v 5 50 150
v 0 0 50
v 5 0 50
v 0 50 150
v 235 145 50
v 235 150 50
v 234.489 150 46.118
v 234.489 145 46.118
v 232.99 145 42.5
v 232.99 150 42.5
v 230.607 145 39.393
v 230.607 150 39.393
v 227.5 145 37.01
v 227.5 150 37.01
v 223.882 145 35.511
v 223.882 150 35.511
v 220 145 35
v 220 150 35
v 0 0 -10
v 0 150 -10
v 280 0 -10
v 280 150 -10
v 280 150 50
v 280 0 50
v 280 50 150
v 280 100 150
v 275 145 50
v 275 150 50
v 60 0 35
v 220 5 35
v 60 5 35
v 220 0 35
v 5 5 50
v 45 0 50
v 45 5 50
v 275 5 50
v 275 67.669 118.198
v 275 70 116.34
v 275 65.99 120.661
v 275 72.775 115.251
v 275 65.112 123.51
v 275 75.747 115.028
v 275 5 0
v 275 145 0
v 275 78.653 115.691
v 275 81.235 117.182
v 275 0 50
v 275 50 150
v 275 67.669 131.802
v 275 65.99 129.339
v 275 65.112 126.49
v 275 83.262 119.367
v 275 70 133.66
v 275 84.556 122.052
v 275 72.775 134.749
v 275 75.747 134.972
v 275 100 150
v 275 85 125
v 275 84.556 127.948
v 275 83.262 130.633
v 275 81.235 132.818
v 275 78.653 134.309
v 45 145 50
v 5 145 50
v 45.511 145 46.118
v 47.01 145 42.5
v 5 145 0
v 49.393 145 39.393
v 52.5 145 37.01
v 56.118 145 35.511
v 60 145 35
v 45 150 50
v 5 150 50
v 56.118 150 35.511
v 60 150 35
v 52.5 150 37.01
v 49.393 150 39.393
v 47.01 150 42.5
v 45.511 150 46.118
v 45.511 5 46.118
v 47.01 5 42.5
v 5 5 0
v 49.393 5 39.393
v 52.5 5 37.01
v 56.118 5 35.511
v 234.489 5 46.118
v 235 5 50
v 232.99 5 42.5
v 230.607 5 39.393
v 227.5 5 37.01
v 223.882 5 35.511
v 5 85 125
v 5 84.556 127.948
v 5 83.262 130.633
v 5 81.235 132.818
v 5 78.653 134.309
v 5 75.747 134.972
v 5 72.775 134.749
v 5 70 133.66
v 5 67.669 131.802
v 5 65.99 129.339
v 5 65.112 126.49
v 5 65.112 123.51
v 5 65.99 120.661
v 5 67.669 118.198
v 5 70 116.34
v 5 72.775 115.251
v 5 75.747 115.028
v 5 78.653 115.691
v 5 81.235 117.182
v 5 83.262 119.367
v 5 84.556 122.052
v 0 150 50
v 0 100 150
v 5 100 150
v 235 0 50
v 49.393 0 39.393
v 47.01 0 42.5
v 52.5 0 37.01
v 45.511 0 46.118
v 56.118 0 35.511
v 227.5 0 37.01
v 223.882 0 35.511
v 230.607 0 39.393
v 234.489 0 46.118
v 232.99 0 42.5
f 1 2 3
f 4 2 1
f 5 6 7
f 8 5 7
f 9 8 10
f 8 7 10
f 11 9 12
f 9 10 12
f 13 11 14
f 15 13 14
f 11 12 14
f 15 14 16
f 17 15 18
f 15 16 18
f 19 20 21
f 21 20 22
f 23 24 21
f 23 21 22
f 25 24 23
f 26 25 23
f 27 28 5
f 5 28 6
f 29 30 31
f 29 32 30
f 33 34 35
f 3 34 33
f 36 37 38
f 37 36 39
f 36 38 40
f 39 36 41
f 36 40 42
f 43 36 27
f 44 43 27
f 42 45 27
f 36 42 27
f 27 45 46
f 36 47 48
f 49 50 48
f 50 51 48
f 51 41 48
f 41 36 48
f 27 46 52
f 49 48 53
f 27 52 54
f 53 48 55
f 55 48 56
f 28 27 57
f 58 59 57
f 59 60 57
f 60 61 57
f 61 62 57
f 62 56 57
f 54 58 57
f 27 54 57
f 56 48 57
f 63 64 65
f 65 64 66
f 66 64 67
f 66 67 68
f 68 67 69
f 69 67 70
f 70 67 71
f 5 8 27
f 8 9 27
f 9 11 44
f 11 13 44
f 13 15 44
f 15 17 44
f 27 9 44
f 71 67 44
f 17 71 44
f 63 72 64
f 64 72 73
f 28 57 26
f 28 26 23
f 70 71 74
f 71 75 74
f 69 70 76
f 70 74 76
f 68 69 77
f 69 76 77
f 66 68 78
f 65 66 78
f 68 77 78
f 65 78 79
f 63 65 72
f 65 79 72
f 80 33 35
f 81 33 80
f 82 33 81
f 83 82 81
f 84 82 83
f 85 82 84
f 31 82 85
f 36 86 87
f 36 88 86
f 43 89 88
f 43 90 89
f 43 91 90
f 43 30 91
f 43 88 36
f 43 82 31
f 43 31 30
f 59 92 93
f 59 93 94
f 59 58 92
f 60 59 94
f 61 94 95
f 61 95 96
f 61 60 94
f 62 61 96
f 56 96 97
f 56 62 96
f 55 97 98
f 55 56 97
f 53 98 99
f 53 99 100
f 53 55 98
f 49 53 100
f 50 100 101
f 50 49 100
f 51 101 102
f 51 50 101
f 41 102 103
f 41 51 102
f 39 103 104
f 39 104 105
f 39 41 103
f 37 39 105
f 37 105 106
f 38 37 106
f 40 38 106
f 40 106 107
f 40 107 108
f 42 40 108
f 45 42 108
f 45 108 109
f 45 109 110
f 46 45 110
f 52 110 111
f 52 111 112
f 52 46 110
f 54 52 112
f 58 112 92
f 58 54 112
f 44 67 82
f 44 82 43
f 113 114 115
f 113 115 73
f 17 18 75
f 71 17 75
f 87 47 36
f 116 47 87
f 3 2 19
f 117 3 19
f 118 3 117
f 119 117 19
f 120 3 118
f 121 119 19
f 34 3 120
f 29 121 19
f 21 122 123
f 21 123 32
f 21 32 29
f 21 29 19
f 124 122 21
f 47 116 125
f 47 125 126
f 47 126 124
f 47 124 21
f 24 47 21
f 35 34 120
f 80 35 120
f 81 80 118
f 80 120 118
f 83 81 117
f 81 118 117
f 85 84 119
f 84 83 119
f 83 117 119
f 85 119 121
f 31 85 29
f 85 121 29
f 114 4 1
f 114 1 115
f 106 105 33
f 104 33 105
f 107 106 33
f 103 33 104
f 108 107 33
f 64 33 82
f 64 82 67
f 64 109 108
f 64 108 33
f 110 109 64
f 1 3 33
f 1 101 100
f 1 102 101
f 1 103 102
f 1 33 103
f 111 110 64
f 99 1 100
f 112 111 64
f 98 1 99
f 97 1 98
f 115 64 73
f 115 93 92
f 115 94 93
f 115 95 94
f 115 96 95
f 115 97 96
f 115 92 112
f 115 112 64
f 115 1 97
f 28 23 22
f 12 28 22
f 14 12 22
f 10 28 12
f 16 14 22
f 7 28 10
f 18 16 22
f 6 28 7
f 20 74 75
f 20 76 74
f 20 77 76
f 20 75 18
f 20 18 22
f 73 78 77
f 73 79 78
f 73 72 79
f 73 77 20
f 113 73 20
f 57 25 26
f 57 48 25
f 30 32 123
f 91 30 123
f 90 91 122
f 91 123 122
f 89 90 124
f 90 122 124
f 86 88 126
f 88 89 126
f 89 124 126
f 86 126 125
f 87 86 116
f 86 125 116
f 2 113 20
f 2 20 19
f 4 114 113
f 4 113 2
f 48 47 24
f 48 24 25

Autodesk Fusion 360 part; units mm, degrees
sketch "Sketch1" plane through (0, 0, 0) normal (1, 0, 0) x (0, 1, 0)
  line L0 (0, 0) -> (0, 50)
  line L1 (0, 0) -> (125, 0)
  line L2 (125, 0) -> (150, 0)
  line L3 (150, 0) -> (150, 50)
  line L4 (0, 50) -> (50, 150)
  line L5 (50, 150) -> (100, 150)
  line L6 (100, 150) -> (150, 50)
  circle A0 centre (75, 125) radius 10
extrude "Extrude1" add sketch "Sketch1" along normal blind 5 makes body 1
ref_plane "WorkPlane1" through (275, 75, 75) normal (1, 0, 0) x (0, 1, 0)
sketch "Sketch2" plane through (275, 75, 75) normal (1, 0, 0) x (0, 1, 0)
  line L0 (-75, -75) -> (-75, -25)
  line L1 (-75, -25) -> (-25, 75)
  line L2 (-25, 75) -> (25, 75)
  line L3 (25, 75) -> (75, -25)
  line L4 (75, -25) -> (75, -75)
  line L5 (75, -75) -> (-75, -75)
  circle A0 centre (0, 50) radius 10
extrude "Extrude2" add sketch "Sketch2" along normal blind 5 separate body makes body 2
sketch "Sketch3" plane through (0, 0, 0) normal (0, 1, 0) x (1, 0, 0)
  line L0 (5, 0) -> (275, 0)
  line L1 (275, 0) -> (275, -50)
  line L2 (275, -50) -> (235, -50)
  line L3 (235, -50) -> (235, -50)
  line L4 (220, -35) -> (60, -35)
  line L5 (45, -50) -> (45, -50)
  line L6 (45, -50) -> (5, -50)
  line L7 (5, -50) -> (5, 0)
  arc A0 (60, -35) -> (45, -50) centre (60, -50) ccw
  arc A1 (235, -50) -> (220, -35) centre (220, -50) ccw
  dimension "d6" = 15
  dimension "d7" = 15
extrude "Extrude3" add sketch "Sketch3" along normal blind 5 bodies 1 2
ref_plane "WorkPlane2" through (0, 150, 0) normal (0, 1, 0) x (0, 0, 1)
sketch "Sketch4" plane through (0, 150, 0) normal (0, 1, 0) x (1, 0, 0)
  line L0 (5, -50) -> (5, 0)
  line L1 (5, 0) -> (275, 0)
  line L2 (275, 0) -> (275, -50)
  line L3 (275, -50) -> (235, -50)
  line L4 (235, -50) -> (235, -50)
  line L5 (220, -35) -> (60, -35)
  line L6 (45, -50) -> (45, -50)
  line L7 (45, -50) -> (5, -50)
  arc A0 (60, -35) -> (45, -50) centre (60, -50) ccw
  arc A1 (235, -50) -> (220, -35) centre (220, -50) ccw
  dimension "d11" = 15
  dimension "d12" = 15
extrude "Extrude4" add sketch "Sketch4" against normal blind 5 bodies 1
sketch "Sketch5" plane through (0, 0, 0) normal (0, 0, 1) x (1, 0, 0)
  line L0 (0, 150) -> (0, 0)
  line L1 (0, 0) -> (280, 0)
  line L2 (280, 0) -> (280, 150)
  line L3 (280, 150) -> (0, 150)
extrude "Extrude5" add sketch "Sketch5" against normal blind 10 bodies 1
sketch "Sketch6" plane through (280, 0, 0) normal (1, 0, 0) x (0, 1, 0)
  circle A0 centre (75, 125) radius 10
  line L0 (150, -10) -> (150, 50)
  line L1 (150, 50) -> (100, 150)
  line L2 (100, 150) -> (50, 150)
  line L3 (50, 150) -> (0, 50)
  line L4 (0, 50) -> (0, -10)
  line L5 (0, -10) -> (150, -10)
  circle A1 centre (75, 125) radius 10
extrude "Extrude6" add sketch "Sketch6" against normal blind 280 contours A0 A1 bodies 1
